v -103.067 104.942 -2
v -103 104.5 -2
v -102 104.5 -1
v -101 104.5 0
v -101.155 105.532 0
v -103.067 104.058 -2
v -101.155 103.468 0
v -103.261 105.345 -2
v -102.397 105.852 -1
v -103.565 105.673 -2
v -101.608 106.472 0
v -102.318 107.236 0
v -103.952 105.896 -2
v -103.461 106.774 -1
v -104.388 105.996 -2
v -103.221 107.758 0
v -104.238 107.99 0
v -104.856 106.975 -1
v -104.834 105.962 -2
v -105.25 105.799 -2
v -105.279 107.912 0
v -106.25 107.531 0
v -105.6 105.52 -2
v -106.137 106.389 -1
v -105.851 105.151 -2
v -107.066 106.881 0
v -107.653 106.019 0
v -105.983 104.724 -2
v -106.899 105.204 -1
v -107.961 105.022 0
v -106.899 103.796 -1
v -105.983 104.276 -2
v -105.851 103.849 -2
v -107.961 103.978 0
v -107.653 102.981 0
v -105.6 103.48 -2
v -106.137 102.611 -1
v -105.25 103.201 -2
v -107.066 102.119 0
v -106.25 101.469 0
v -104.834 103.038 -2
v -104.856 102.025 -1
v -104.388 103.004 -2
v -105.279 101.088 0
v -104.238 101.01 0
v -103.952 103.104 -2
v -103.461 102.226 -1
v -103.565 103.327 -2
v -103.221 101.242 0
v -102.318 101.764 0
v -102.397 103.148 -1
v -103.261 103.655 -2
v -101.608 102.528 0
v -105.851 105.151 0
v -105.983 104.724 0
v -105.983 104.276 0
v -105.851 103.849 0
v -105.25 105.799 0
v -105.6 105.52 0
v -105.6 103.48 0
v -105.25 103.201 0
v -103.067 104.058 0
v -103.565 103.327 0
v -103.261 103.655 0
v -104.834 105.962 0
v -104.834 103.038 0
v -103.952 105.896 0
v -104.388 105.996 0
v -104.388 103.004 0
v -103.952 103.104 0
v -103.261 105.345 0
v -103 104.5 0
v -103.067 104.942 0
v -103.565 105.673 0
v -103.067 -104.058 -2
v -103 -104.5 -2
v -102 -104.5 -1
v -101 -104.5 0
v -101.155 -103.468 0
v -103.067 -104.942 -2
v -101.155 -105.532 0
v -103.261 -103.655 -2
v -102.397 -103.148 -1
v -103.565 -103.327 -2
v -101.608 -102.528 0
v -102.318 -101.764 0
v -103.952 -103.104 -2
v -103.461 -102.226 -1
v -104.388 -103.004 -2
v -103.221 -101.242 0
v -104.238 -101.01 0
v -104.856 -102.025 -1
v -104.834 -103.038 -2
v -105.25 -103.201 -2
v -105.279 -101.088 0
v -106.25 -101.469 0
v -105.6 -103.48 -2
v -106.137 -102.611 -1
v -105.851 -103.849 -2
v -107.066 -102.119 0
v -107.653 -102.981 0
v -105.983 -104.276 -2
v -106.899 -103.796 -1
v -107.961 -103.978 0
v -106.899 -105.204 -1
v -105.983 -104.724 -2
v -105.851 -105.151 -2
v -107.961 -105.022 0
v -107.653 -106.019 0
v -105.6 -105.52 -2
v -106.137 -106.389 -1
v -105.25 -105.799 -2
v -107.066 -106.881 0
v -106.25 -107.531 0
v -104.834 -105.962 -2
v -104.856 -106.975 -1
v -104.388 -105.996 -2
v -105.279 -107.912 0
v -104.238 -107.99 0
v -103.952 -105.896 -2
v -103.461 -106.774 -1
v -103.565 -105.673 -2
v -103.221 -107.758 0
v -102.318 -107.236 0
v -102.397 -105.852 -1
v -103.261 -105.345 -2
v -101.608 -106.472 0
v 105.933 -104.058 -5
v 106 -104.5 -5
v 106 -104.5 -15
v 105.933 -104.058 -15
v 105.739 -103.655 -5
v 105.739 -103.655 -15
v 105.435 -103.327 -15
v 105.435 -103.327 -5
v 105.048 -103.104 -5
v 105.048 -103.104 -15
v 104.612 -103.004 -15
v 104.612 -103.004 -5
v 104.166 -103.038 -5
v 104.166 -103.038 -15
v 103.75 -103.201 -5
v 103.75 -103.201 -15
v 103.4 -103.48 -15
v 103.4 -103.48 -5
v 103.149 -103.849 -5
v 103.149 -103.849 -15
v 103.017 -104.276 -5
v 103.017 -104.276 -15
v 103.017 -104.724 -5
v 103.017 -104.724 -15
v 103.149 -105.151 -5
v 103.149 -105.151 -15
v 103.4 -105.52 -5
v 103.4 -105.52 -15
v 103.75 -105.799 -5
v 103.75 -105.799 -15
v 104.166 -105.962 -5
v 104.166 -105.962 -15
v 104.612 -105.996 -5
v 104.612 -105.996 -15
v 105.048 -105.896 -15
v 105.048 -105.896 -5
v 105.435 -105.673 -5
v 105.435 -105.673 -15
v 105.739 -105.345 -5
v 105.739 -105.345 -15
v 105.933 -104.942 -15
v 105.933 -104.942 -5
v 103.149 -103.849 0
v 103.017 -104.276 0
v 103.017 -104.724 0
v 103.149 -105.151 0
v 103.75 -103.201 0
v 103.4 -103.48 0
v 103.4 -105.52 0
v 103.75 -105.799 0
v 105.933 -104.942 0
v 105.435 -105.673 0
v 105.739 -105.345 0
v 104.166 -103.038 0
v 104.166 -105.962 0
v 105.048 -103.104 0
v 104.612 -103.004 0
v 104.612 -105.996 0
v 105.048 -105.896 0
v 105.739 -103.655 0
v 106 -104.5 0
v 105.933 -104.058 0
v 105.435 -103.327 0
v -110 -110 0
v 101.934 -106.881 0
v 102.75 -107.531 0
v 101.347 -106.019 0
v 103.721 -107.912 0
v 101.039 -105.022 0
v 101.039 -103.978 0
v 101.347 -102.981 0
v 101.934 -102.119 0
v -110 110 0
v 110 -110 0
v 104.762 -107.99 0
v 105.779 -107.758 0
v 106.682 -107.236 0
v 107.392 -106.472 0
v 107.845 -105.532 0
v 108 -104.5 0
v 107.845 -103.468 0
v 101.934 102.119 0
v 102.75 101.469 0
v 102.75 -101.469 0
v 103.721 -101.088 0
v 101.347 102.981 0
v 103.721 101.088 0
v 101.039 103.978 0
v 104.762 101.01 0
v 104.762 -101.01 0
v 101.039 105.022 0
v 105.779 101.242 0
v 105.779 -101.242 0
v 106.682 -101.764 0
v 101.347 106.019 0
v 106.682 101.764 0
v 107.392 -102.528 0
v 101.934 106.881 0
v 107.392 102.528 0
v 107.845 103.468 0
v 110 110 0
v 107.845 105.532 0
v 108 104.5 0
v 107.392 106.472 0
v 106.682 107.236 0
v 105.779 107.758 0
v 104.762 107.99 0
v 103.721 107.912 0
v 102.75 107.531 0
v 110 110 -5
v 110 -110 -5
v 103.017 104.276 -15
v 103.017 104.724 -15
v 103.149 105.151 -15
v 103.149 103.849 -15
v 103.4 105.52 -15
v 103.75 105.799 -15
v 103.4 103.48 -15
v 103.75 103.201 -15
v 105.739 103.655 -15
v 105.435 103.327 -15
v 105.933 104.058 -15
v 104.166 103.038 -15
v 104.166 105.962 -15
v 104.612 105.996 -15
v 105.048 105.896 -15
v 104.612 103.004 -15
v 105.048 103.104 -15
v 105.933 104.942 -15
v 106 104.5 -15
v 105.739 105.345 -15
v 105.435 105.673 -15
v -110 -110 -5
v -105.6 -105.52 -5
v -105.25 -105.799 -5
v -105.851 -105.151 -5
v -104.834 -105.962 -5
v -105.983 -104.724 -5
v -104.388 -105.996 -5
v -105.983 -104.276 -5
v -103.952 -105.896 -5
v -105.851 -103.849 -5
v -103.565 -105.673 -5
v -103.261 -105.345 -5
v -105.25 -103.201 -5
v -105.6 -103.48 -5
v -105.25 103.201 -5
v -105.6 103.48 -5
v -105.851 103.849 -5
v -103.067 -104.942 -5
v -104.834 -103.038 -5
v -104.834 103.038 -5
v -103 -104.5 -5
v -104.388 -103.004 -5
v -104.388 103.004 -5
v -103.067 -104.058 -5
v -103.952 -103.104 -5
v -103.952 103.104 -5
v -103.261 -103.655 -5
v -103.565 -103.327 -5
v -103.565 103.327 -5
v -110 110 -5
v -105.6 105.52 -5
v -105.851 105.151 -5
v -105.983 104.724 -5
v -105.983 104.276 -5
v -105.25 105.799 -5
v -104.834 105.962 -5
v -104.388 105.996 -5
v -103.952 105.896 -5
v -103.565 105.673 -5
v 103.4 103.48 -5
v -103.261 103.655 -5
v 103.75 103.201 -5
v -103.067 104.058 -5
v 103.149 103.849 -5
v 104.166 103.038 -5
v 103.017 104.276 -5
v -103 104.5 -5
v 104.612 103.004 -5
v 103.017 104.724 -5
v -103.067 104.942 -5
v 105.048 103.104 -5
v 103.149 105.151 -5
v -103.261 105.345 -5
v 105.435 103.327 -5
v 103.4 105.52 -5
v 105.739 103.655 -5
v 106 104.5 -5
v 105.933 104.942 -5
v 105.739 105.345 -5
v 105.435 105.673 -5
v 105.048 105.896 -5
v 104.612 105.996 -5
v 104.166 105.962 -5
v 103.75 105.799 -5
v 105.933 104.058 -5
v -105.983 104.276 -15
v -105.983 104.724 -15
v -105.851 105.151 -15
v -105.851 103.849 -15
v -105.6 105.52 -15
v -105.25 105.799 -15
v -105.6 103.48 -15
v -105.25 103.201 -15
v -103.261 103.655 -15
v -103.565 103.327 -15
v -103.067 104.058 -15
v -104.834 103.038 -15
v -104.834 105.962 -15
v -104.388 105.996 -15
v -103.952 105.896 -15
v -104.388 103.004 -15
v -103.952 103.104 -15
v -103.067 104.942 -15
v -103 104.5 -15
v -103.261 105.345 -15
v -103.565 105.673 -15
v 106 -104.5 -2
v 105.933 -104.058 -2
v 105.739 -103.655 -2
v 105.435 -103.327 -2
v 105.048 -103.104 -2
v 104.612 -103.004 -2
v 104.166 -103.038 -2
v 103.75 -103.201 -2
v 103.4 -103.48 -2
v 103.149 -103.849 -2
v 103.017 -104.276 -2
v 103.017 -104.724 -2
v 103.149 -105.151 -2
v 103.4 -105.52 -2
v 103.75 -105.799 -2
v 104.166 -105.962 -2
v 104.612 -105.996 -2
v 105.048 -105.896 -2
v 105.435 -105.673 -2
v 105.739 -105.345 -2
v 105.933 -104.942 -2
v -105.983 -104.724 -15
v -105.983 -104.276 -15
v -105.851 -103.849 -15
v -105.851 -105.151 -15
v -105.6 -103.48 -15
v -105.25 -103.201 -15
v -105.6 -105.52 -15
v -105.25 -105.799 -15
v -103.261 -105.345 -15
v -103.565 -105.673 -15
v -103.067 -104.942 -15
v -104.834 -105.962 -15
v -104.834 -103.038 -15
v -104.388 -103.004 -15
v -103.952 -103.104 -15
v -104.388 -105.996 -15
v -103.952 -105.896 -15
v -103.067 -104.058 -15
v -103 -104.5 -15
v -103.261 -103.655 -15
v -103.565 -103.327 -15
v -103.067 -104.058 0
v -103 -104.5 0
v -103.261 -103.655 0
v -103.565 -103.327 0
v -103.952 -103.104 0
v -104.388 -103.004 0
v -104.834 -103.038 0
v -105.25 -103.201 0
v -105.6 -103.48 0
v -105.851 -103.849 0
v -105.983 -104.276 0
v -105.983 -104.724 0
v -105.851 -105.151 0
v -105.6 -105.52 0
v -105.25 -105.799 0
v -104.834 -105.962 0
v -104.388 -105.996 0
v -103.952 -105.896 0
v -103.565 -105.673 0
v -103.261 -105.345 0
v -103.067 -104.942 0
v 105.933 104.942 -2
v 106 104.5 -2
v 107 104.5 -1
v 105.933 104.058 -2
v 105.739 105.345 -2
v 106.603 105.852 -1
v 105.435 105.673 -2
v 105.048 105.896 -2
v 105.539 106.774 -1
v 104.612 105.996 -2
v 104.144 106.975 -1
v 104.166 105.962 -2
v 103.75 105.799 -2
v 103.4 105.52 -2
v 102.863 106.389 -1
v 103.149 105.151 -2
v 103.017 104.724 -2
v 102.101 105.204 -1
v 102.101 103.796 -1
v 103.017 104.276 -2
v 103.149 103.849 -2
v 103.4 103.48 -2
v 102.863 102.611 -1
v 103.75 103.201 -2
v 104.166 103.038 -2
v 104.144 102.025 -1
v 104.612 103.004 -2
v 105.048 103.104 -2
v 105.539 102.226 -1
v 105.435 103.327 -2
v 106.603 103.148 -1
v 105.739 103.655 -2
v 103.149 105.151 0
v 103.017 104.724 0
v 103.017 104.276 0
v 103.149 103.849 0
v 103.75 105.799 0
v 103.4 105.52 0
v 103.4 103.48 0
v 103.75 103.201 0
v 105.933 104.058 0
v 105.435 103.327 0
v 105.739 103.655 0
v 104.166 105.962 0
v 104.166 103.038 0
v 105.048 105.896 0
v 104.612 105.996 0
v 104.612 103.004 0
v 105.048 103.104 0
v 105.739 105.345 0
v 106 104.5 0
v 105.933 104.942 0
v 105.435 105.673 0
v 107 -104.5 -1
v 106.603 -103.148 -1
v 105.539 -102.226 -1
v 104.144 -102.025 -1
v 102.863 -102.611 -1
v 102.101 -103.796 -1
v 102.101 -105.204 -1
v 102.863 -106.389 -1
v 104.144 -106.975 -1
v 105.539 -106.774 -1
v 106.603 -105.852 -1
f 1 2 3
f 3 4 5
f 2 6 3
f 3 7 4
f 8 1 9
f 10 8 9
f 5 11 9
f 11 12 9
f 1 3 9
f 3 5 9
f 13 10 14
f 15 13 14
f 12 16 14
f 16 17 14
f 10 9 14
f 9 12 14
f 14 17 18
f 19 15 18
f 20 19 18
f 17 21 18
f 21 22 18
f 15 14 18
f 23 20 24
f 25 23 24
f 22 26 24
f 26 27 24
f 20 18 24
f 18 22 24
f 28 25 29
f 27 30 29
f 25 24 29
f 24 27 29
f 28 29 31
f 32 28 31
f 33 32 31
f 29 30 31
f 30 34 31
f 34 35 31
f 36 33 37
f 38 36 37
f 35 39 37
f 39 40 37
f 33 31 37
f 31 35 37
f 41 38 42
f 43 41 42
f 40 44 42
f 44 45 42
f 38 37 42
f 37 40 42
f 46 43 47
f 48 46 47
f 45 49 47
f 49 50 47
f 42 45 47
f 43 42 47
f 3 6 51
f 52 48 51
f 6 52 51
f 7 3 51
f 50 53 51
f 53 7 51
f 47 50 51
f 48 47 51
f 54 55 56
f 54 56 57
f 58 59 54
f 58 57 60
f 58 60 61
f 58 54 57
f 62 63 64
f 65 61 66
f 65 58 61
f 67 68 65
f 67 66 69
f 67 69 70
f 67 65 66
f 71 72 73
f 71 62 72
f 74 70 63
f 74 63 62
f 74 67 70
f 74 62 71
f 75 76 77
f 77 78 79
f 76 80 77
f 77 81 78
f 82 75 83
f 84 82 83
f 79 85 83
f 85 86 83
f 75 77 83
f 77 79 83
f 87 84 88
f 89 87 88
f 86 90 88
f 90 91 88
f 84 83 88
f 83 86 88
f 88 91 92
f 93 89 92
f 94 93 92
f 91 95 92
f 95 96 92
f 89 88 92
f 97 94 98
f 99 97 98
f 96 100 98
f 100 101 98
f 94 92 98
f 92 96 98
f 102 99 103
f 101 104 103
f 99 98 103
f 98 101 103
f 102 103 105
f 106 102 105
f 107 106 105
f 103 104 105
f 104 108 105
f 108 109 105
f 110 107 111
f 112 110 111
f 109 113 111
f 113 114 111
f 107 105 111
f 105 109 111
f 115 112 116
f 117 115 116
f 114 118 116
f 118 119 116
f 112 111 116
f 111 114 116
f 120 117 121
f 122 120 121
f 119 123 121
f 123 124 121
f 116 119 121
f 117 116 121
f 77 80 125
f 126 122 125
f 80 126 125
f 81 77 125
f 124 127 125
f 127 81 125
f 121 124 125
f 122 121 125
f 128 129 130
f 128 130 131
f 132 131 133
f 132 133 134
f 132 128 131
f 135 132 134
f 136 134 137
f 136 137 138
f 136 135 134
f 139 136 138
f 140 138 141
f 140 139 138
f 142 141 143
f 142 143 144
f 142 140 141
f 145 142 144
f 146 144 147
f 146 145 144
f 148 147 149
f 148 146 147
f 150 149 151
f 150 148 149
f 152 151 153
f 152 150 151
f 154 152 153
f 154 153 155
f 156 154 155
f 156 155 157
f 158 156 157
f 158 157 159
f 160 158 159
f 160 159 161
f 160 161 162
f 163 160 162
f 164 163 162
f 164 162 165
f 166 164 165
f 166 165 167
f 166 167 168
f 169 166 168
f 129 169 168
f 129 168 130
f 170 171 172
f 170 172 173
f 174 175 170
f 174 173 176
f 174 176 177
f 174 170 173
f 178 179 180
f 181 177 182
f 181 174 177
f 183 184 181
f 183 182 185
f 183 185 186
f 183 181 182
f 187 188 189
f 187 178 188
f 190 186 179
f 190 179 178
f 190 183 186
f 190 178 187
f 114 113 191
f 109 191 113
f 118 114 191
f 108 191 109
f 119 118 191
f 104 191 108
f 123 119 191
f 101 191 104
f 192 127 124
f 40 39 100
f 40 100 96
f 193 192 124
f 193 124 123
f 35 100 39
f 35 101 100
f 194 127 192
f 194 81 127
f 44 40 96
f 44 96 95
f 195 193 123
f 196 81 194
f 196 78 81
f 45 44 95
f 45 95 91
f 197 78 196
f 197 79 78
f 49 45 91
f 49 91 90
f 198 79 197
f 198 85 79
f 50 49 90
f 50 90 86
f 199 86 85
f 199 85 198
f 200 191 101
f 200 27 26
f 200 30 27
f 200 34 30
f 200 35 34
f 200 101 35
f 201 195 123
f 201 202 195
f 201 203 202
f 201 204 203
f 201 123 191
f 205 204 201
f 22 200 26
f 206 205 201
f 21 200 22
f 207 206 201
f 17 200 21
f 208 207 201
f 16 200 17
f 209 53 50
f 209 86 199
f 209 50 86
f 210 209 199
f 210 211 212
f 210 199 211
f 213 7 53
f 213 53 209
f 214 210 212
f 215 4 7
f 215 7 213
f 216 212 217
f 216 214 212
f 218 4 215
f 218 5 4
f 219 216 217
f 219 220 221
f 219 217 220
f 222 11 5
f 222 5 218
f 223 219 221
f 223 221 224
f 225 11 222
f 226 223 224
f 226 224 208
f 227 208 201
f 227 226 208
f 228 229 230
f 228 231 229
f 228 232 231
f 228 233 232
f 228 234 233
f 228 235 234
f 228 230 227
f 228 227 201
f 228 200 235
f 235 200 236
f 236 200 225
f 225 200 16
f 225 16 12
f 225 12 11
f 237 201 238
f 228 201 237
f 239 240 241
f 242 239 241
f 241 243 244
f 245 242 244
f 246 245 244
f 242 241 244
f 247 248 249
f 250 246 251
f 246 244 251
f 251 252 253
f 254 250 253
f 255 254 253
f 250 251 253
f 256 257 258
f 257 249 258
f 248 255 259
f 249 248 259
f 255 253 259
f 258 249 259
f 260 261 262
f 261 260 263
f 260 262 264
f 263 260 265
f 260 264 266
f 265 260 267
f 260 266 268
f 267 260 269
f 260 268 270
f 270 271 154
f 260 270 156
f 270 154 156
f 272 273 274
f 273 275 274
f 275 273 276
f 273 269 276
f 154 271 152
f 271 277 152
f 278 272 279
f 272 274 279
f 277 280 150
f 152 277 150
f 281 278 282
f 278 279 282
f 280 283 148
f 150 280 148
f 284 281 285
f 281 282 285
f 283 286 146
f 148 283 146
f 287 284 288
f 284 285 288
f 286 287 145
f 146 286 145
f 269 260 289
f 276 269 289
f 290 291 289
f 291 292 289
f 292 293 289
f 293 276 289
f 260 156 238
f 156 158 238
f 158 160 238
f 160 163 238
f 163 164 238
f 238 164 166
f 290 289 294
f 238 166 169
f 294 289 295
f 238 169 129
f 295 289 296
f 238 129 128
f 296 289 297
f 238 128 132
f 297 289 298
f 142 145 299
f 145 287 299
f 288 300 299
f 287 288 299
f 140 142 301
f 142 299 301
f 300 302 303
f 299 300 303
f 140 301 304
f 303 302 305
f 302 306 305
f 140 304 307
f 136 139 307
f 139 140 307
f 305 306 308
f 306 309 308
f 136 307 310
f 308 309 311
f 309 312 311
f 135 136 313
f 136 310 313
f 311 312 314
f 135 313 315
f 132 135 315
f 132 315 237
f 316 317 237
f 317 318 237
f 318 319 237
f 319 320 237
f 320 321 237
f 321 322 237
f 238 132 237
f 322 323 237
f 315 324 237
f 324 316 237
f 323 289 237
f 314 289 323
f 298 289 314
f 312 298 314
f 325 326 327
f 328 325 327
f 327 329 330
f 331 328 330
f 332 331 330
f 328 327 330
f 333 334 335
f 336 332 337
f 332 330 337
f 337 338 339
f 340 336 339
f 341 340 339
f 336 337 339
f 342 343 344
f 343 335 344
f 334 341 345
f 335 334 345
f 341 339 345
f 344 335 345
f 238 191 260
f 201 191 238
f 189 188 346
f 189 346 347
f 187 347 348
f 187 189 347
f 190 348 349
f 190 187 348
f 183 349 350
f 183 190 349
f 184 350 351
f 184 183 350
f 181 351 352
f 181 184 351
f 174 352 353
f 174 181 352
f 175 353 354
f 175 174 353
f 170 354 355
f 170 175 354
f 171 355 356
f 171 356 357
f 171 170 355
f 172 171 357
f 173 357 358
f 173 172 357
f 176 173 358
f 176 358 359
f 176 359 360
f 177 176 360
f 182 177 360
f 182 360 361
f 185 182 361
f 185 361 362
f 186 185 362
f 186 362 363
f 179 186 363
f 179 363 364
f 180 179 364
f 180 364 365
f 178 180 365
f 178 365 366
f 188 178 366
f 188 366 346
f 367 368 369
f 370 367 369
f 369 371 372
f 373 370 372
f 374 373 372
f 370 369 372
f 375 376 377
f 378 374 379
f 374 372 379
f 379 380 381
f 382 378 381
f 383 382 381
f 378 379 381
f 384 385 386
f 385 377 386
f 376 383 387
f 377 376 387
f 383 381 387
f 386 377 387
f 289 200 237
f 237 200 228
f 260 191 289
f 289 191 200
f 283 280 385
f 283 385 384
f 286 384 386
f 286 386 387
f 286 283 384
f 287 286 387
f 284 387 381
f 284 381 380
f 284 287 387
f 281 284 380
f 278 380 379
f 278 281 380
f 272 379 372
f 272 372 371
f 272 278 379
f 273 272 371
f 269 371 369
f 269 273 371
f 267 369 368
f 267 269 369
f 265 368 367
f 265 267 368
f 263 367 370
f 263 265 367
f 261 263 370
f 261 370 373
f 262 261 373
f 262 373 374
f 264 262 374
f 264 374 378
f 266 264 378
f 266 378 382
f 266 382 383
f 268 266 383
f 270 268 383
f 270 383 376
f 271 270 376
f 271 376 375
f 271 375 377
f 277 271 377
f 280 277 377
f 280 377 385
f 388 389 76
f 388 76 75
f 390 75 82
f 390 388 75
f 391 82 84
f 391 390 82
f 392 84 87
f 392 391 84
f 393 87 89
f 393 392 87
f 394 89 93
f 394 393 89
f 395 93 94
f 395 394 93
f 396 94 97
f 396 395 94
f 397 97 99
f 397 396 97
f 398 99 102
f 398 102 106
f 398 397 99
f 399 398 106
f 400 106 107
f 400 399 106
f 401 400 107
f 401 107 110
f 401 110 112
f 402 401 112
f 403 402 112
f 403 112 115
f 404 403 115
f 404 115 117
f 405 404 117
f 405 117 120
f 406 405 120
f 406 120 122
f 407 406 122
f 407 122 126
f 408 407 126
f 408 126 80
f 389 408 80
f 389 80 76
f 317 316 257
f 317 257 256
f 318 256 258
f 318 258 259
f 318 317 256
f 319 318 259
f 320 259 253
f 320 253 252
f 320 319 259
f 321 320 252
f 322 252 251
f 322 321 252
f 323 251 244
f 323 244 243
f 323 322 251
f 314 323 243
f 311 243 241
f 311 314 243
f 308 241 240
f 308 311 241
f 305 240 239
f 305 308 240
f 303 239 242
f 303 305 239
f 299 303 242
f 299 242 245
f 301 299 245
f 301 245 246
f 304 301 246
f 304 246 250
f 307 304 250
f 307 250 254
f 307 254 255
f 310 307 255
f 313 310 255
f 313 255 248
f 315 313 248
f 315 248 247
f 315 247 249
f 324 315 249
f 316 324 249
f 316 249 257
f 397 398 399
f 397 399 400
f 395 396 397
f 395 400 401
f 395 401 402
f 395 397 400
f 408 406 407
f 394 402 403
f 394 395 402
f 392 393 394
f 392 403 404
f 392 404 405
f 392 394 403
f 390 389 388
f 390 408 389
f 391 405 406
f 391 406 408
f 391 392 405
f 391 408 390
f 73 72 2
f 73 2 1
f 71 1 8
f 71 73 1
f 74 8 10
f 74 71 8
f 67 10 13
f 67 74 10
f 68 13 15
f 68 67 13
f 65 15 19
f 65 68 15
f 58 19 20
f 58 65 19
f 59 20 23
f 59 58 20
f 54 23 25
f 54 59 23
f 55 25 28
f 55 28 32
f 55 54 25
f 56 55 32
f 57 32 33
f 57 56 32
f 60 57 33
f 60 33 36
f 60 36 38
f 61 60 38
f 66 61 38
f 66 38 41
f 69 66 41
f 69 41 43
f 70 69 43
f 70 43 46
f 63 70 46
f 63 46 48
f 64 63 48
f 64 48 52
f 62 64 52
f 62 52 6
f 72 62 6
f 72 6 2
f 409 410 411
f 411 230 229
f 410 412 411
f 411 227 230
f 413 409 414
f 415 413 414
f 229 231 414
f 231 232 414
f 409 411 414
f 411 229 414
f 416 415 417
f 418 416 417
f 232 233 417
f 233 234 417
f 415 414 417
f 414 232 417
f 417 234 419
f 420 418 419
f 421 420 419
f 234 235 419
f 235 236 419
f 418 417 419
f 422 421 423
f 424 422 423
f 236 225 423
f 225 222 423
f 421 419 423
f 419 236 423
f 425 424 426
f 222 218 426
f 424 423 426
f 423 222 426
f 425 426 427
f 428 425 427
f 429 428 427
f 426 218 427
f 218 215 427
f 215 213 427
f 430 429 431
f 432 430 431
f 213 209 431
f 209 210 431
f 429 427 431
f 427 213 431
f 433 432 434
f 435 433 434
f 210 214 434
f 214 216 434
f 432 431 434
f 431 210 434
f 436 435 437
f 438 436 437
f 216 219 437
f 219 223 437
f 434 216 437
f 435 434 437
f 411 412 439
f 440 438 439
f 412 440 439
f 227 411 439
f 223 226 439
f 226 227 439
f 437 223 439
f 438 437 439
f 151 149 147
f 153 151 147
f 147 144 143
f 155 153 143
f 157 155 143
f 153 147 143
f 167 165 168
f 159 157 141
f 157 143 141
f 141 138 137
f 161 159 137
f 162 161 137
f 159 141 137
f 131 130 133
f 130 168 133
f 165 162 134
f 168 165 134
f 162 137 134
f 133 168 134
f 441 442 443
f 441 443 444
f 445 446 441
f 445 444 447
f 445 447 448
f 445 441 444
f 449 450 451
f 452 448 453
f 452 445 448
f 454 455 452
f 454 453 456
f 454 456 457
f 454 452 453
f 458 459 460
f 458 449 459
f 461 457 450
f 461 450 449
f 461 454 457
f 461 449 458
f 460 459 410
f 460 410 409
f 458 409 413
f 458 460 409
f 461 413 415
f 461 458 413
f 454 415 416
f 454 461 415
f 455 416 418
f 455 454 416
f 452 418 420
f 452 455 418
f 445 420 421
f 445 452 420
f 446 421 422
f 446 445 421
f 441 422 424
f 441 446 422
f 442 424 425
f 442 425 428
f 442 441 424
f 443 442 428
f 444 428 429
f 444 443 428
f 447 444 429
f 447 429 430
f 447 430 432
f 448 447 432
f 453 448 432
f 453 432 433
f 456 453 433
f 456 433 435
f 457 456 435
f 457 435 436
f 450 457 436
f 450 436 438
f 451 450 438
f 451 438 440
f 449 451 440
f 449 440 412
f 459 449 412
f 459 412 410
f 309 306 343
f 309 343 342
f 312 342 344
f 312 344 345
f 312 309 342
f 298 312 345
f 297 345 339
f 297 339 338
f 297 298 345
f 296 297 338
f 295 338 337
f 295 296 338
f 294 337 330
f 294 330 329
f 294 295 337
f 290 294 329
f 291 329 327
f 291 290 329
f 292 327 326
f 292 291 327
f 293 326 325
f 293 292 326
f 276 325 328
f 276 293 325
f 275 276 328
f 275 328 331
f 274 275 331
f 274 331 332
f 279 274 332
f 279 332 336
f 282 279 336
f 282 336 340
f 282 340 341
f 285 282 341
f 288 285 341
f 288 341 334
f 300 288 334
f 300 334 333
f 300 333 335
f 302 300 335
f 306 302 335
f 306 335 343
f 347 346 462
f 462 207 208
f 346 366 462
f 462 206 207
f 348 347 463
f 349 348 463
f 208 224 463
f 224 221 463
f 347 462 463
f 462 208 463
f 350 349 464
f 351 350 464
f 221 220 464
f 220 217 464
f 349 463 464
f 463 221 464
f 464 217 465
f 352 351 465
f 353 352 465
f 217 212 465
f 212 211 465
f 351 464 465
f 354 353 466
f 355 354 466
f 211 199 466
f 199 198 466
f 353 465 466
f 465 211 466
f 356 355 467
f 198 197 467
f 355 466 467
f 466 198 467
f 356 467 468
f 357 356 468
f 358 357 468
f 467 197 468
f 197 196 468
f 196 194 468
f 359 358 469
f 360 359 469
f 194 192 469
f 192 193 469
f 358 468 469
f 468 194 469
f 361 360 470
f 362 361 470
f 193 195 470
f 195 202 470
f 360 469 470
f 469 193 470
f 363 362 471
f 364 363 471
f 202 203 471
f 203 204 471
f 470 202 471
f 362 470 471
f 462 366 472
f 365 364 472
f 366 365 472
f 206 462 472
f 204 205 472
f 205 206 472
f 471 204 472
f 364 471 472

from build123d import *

# Parameters (mm, degrees)
F0_W     = 220
F0_H     = 220
F0_R     = 1.5
F1_DEPTH = 5
F2_SIZE  = 2
F3_DEPTH = 15


with BuildPart() as f1:
    # F0 (on Top) → F1 (new body)
    with BuildSketch(Plane.XY):
        Rectangle(F0_W, F0_H)
        with Locations((-104.5, -104.5)):
            Circle(F0_R, mode=Mode.SUBTRACT)
        with Locations((104.5, -104.5)):
            Circle(F0_R, mode=Mode.SUBTRACT)
        with Locations((-104.5, 104.5)):
            Circle(F0_R, mode=Mode.SUBTRACT)
        with Locations((104.5, 104.5)):
            Circle(F0_R, mode=Mode.SUBTRACT)
    extrude(amount=-F1_DEPTH)

    # F2
    f2_edges = [f1.edges().sort_by_distance(p)[0] for p in [
        (-106, 104.5, 0),
        (103, 104.5, 0),
        (103, -104.5, 0),
        (-106, -104.5, 0),
    ]]
    chamfer(f2_edges, length=F2_SIZE)

    # F0 (on Top) → F3 (join)
    with BuildSketch(Plane.XY):
        with Locations((-104.5, 104.5)):
            Circle(F0_R)
        with Locations((-104.5, -104.5)):
            Circle(F0_R)
        with Locations((104.5, -104.5)):
            Circle(F0_R)
        with Locations((104.5, 104.5)):
            Circle(F0_R)
    extrude(amount=-F3_DEPTH)


solid = f1.part
